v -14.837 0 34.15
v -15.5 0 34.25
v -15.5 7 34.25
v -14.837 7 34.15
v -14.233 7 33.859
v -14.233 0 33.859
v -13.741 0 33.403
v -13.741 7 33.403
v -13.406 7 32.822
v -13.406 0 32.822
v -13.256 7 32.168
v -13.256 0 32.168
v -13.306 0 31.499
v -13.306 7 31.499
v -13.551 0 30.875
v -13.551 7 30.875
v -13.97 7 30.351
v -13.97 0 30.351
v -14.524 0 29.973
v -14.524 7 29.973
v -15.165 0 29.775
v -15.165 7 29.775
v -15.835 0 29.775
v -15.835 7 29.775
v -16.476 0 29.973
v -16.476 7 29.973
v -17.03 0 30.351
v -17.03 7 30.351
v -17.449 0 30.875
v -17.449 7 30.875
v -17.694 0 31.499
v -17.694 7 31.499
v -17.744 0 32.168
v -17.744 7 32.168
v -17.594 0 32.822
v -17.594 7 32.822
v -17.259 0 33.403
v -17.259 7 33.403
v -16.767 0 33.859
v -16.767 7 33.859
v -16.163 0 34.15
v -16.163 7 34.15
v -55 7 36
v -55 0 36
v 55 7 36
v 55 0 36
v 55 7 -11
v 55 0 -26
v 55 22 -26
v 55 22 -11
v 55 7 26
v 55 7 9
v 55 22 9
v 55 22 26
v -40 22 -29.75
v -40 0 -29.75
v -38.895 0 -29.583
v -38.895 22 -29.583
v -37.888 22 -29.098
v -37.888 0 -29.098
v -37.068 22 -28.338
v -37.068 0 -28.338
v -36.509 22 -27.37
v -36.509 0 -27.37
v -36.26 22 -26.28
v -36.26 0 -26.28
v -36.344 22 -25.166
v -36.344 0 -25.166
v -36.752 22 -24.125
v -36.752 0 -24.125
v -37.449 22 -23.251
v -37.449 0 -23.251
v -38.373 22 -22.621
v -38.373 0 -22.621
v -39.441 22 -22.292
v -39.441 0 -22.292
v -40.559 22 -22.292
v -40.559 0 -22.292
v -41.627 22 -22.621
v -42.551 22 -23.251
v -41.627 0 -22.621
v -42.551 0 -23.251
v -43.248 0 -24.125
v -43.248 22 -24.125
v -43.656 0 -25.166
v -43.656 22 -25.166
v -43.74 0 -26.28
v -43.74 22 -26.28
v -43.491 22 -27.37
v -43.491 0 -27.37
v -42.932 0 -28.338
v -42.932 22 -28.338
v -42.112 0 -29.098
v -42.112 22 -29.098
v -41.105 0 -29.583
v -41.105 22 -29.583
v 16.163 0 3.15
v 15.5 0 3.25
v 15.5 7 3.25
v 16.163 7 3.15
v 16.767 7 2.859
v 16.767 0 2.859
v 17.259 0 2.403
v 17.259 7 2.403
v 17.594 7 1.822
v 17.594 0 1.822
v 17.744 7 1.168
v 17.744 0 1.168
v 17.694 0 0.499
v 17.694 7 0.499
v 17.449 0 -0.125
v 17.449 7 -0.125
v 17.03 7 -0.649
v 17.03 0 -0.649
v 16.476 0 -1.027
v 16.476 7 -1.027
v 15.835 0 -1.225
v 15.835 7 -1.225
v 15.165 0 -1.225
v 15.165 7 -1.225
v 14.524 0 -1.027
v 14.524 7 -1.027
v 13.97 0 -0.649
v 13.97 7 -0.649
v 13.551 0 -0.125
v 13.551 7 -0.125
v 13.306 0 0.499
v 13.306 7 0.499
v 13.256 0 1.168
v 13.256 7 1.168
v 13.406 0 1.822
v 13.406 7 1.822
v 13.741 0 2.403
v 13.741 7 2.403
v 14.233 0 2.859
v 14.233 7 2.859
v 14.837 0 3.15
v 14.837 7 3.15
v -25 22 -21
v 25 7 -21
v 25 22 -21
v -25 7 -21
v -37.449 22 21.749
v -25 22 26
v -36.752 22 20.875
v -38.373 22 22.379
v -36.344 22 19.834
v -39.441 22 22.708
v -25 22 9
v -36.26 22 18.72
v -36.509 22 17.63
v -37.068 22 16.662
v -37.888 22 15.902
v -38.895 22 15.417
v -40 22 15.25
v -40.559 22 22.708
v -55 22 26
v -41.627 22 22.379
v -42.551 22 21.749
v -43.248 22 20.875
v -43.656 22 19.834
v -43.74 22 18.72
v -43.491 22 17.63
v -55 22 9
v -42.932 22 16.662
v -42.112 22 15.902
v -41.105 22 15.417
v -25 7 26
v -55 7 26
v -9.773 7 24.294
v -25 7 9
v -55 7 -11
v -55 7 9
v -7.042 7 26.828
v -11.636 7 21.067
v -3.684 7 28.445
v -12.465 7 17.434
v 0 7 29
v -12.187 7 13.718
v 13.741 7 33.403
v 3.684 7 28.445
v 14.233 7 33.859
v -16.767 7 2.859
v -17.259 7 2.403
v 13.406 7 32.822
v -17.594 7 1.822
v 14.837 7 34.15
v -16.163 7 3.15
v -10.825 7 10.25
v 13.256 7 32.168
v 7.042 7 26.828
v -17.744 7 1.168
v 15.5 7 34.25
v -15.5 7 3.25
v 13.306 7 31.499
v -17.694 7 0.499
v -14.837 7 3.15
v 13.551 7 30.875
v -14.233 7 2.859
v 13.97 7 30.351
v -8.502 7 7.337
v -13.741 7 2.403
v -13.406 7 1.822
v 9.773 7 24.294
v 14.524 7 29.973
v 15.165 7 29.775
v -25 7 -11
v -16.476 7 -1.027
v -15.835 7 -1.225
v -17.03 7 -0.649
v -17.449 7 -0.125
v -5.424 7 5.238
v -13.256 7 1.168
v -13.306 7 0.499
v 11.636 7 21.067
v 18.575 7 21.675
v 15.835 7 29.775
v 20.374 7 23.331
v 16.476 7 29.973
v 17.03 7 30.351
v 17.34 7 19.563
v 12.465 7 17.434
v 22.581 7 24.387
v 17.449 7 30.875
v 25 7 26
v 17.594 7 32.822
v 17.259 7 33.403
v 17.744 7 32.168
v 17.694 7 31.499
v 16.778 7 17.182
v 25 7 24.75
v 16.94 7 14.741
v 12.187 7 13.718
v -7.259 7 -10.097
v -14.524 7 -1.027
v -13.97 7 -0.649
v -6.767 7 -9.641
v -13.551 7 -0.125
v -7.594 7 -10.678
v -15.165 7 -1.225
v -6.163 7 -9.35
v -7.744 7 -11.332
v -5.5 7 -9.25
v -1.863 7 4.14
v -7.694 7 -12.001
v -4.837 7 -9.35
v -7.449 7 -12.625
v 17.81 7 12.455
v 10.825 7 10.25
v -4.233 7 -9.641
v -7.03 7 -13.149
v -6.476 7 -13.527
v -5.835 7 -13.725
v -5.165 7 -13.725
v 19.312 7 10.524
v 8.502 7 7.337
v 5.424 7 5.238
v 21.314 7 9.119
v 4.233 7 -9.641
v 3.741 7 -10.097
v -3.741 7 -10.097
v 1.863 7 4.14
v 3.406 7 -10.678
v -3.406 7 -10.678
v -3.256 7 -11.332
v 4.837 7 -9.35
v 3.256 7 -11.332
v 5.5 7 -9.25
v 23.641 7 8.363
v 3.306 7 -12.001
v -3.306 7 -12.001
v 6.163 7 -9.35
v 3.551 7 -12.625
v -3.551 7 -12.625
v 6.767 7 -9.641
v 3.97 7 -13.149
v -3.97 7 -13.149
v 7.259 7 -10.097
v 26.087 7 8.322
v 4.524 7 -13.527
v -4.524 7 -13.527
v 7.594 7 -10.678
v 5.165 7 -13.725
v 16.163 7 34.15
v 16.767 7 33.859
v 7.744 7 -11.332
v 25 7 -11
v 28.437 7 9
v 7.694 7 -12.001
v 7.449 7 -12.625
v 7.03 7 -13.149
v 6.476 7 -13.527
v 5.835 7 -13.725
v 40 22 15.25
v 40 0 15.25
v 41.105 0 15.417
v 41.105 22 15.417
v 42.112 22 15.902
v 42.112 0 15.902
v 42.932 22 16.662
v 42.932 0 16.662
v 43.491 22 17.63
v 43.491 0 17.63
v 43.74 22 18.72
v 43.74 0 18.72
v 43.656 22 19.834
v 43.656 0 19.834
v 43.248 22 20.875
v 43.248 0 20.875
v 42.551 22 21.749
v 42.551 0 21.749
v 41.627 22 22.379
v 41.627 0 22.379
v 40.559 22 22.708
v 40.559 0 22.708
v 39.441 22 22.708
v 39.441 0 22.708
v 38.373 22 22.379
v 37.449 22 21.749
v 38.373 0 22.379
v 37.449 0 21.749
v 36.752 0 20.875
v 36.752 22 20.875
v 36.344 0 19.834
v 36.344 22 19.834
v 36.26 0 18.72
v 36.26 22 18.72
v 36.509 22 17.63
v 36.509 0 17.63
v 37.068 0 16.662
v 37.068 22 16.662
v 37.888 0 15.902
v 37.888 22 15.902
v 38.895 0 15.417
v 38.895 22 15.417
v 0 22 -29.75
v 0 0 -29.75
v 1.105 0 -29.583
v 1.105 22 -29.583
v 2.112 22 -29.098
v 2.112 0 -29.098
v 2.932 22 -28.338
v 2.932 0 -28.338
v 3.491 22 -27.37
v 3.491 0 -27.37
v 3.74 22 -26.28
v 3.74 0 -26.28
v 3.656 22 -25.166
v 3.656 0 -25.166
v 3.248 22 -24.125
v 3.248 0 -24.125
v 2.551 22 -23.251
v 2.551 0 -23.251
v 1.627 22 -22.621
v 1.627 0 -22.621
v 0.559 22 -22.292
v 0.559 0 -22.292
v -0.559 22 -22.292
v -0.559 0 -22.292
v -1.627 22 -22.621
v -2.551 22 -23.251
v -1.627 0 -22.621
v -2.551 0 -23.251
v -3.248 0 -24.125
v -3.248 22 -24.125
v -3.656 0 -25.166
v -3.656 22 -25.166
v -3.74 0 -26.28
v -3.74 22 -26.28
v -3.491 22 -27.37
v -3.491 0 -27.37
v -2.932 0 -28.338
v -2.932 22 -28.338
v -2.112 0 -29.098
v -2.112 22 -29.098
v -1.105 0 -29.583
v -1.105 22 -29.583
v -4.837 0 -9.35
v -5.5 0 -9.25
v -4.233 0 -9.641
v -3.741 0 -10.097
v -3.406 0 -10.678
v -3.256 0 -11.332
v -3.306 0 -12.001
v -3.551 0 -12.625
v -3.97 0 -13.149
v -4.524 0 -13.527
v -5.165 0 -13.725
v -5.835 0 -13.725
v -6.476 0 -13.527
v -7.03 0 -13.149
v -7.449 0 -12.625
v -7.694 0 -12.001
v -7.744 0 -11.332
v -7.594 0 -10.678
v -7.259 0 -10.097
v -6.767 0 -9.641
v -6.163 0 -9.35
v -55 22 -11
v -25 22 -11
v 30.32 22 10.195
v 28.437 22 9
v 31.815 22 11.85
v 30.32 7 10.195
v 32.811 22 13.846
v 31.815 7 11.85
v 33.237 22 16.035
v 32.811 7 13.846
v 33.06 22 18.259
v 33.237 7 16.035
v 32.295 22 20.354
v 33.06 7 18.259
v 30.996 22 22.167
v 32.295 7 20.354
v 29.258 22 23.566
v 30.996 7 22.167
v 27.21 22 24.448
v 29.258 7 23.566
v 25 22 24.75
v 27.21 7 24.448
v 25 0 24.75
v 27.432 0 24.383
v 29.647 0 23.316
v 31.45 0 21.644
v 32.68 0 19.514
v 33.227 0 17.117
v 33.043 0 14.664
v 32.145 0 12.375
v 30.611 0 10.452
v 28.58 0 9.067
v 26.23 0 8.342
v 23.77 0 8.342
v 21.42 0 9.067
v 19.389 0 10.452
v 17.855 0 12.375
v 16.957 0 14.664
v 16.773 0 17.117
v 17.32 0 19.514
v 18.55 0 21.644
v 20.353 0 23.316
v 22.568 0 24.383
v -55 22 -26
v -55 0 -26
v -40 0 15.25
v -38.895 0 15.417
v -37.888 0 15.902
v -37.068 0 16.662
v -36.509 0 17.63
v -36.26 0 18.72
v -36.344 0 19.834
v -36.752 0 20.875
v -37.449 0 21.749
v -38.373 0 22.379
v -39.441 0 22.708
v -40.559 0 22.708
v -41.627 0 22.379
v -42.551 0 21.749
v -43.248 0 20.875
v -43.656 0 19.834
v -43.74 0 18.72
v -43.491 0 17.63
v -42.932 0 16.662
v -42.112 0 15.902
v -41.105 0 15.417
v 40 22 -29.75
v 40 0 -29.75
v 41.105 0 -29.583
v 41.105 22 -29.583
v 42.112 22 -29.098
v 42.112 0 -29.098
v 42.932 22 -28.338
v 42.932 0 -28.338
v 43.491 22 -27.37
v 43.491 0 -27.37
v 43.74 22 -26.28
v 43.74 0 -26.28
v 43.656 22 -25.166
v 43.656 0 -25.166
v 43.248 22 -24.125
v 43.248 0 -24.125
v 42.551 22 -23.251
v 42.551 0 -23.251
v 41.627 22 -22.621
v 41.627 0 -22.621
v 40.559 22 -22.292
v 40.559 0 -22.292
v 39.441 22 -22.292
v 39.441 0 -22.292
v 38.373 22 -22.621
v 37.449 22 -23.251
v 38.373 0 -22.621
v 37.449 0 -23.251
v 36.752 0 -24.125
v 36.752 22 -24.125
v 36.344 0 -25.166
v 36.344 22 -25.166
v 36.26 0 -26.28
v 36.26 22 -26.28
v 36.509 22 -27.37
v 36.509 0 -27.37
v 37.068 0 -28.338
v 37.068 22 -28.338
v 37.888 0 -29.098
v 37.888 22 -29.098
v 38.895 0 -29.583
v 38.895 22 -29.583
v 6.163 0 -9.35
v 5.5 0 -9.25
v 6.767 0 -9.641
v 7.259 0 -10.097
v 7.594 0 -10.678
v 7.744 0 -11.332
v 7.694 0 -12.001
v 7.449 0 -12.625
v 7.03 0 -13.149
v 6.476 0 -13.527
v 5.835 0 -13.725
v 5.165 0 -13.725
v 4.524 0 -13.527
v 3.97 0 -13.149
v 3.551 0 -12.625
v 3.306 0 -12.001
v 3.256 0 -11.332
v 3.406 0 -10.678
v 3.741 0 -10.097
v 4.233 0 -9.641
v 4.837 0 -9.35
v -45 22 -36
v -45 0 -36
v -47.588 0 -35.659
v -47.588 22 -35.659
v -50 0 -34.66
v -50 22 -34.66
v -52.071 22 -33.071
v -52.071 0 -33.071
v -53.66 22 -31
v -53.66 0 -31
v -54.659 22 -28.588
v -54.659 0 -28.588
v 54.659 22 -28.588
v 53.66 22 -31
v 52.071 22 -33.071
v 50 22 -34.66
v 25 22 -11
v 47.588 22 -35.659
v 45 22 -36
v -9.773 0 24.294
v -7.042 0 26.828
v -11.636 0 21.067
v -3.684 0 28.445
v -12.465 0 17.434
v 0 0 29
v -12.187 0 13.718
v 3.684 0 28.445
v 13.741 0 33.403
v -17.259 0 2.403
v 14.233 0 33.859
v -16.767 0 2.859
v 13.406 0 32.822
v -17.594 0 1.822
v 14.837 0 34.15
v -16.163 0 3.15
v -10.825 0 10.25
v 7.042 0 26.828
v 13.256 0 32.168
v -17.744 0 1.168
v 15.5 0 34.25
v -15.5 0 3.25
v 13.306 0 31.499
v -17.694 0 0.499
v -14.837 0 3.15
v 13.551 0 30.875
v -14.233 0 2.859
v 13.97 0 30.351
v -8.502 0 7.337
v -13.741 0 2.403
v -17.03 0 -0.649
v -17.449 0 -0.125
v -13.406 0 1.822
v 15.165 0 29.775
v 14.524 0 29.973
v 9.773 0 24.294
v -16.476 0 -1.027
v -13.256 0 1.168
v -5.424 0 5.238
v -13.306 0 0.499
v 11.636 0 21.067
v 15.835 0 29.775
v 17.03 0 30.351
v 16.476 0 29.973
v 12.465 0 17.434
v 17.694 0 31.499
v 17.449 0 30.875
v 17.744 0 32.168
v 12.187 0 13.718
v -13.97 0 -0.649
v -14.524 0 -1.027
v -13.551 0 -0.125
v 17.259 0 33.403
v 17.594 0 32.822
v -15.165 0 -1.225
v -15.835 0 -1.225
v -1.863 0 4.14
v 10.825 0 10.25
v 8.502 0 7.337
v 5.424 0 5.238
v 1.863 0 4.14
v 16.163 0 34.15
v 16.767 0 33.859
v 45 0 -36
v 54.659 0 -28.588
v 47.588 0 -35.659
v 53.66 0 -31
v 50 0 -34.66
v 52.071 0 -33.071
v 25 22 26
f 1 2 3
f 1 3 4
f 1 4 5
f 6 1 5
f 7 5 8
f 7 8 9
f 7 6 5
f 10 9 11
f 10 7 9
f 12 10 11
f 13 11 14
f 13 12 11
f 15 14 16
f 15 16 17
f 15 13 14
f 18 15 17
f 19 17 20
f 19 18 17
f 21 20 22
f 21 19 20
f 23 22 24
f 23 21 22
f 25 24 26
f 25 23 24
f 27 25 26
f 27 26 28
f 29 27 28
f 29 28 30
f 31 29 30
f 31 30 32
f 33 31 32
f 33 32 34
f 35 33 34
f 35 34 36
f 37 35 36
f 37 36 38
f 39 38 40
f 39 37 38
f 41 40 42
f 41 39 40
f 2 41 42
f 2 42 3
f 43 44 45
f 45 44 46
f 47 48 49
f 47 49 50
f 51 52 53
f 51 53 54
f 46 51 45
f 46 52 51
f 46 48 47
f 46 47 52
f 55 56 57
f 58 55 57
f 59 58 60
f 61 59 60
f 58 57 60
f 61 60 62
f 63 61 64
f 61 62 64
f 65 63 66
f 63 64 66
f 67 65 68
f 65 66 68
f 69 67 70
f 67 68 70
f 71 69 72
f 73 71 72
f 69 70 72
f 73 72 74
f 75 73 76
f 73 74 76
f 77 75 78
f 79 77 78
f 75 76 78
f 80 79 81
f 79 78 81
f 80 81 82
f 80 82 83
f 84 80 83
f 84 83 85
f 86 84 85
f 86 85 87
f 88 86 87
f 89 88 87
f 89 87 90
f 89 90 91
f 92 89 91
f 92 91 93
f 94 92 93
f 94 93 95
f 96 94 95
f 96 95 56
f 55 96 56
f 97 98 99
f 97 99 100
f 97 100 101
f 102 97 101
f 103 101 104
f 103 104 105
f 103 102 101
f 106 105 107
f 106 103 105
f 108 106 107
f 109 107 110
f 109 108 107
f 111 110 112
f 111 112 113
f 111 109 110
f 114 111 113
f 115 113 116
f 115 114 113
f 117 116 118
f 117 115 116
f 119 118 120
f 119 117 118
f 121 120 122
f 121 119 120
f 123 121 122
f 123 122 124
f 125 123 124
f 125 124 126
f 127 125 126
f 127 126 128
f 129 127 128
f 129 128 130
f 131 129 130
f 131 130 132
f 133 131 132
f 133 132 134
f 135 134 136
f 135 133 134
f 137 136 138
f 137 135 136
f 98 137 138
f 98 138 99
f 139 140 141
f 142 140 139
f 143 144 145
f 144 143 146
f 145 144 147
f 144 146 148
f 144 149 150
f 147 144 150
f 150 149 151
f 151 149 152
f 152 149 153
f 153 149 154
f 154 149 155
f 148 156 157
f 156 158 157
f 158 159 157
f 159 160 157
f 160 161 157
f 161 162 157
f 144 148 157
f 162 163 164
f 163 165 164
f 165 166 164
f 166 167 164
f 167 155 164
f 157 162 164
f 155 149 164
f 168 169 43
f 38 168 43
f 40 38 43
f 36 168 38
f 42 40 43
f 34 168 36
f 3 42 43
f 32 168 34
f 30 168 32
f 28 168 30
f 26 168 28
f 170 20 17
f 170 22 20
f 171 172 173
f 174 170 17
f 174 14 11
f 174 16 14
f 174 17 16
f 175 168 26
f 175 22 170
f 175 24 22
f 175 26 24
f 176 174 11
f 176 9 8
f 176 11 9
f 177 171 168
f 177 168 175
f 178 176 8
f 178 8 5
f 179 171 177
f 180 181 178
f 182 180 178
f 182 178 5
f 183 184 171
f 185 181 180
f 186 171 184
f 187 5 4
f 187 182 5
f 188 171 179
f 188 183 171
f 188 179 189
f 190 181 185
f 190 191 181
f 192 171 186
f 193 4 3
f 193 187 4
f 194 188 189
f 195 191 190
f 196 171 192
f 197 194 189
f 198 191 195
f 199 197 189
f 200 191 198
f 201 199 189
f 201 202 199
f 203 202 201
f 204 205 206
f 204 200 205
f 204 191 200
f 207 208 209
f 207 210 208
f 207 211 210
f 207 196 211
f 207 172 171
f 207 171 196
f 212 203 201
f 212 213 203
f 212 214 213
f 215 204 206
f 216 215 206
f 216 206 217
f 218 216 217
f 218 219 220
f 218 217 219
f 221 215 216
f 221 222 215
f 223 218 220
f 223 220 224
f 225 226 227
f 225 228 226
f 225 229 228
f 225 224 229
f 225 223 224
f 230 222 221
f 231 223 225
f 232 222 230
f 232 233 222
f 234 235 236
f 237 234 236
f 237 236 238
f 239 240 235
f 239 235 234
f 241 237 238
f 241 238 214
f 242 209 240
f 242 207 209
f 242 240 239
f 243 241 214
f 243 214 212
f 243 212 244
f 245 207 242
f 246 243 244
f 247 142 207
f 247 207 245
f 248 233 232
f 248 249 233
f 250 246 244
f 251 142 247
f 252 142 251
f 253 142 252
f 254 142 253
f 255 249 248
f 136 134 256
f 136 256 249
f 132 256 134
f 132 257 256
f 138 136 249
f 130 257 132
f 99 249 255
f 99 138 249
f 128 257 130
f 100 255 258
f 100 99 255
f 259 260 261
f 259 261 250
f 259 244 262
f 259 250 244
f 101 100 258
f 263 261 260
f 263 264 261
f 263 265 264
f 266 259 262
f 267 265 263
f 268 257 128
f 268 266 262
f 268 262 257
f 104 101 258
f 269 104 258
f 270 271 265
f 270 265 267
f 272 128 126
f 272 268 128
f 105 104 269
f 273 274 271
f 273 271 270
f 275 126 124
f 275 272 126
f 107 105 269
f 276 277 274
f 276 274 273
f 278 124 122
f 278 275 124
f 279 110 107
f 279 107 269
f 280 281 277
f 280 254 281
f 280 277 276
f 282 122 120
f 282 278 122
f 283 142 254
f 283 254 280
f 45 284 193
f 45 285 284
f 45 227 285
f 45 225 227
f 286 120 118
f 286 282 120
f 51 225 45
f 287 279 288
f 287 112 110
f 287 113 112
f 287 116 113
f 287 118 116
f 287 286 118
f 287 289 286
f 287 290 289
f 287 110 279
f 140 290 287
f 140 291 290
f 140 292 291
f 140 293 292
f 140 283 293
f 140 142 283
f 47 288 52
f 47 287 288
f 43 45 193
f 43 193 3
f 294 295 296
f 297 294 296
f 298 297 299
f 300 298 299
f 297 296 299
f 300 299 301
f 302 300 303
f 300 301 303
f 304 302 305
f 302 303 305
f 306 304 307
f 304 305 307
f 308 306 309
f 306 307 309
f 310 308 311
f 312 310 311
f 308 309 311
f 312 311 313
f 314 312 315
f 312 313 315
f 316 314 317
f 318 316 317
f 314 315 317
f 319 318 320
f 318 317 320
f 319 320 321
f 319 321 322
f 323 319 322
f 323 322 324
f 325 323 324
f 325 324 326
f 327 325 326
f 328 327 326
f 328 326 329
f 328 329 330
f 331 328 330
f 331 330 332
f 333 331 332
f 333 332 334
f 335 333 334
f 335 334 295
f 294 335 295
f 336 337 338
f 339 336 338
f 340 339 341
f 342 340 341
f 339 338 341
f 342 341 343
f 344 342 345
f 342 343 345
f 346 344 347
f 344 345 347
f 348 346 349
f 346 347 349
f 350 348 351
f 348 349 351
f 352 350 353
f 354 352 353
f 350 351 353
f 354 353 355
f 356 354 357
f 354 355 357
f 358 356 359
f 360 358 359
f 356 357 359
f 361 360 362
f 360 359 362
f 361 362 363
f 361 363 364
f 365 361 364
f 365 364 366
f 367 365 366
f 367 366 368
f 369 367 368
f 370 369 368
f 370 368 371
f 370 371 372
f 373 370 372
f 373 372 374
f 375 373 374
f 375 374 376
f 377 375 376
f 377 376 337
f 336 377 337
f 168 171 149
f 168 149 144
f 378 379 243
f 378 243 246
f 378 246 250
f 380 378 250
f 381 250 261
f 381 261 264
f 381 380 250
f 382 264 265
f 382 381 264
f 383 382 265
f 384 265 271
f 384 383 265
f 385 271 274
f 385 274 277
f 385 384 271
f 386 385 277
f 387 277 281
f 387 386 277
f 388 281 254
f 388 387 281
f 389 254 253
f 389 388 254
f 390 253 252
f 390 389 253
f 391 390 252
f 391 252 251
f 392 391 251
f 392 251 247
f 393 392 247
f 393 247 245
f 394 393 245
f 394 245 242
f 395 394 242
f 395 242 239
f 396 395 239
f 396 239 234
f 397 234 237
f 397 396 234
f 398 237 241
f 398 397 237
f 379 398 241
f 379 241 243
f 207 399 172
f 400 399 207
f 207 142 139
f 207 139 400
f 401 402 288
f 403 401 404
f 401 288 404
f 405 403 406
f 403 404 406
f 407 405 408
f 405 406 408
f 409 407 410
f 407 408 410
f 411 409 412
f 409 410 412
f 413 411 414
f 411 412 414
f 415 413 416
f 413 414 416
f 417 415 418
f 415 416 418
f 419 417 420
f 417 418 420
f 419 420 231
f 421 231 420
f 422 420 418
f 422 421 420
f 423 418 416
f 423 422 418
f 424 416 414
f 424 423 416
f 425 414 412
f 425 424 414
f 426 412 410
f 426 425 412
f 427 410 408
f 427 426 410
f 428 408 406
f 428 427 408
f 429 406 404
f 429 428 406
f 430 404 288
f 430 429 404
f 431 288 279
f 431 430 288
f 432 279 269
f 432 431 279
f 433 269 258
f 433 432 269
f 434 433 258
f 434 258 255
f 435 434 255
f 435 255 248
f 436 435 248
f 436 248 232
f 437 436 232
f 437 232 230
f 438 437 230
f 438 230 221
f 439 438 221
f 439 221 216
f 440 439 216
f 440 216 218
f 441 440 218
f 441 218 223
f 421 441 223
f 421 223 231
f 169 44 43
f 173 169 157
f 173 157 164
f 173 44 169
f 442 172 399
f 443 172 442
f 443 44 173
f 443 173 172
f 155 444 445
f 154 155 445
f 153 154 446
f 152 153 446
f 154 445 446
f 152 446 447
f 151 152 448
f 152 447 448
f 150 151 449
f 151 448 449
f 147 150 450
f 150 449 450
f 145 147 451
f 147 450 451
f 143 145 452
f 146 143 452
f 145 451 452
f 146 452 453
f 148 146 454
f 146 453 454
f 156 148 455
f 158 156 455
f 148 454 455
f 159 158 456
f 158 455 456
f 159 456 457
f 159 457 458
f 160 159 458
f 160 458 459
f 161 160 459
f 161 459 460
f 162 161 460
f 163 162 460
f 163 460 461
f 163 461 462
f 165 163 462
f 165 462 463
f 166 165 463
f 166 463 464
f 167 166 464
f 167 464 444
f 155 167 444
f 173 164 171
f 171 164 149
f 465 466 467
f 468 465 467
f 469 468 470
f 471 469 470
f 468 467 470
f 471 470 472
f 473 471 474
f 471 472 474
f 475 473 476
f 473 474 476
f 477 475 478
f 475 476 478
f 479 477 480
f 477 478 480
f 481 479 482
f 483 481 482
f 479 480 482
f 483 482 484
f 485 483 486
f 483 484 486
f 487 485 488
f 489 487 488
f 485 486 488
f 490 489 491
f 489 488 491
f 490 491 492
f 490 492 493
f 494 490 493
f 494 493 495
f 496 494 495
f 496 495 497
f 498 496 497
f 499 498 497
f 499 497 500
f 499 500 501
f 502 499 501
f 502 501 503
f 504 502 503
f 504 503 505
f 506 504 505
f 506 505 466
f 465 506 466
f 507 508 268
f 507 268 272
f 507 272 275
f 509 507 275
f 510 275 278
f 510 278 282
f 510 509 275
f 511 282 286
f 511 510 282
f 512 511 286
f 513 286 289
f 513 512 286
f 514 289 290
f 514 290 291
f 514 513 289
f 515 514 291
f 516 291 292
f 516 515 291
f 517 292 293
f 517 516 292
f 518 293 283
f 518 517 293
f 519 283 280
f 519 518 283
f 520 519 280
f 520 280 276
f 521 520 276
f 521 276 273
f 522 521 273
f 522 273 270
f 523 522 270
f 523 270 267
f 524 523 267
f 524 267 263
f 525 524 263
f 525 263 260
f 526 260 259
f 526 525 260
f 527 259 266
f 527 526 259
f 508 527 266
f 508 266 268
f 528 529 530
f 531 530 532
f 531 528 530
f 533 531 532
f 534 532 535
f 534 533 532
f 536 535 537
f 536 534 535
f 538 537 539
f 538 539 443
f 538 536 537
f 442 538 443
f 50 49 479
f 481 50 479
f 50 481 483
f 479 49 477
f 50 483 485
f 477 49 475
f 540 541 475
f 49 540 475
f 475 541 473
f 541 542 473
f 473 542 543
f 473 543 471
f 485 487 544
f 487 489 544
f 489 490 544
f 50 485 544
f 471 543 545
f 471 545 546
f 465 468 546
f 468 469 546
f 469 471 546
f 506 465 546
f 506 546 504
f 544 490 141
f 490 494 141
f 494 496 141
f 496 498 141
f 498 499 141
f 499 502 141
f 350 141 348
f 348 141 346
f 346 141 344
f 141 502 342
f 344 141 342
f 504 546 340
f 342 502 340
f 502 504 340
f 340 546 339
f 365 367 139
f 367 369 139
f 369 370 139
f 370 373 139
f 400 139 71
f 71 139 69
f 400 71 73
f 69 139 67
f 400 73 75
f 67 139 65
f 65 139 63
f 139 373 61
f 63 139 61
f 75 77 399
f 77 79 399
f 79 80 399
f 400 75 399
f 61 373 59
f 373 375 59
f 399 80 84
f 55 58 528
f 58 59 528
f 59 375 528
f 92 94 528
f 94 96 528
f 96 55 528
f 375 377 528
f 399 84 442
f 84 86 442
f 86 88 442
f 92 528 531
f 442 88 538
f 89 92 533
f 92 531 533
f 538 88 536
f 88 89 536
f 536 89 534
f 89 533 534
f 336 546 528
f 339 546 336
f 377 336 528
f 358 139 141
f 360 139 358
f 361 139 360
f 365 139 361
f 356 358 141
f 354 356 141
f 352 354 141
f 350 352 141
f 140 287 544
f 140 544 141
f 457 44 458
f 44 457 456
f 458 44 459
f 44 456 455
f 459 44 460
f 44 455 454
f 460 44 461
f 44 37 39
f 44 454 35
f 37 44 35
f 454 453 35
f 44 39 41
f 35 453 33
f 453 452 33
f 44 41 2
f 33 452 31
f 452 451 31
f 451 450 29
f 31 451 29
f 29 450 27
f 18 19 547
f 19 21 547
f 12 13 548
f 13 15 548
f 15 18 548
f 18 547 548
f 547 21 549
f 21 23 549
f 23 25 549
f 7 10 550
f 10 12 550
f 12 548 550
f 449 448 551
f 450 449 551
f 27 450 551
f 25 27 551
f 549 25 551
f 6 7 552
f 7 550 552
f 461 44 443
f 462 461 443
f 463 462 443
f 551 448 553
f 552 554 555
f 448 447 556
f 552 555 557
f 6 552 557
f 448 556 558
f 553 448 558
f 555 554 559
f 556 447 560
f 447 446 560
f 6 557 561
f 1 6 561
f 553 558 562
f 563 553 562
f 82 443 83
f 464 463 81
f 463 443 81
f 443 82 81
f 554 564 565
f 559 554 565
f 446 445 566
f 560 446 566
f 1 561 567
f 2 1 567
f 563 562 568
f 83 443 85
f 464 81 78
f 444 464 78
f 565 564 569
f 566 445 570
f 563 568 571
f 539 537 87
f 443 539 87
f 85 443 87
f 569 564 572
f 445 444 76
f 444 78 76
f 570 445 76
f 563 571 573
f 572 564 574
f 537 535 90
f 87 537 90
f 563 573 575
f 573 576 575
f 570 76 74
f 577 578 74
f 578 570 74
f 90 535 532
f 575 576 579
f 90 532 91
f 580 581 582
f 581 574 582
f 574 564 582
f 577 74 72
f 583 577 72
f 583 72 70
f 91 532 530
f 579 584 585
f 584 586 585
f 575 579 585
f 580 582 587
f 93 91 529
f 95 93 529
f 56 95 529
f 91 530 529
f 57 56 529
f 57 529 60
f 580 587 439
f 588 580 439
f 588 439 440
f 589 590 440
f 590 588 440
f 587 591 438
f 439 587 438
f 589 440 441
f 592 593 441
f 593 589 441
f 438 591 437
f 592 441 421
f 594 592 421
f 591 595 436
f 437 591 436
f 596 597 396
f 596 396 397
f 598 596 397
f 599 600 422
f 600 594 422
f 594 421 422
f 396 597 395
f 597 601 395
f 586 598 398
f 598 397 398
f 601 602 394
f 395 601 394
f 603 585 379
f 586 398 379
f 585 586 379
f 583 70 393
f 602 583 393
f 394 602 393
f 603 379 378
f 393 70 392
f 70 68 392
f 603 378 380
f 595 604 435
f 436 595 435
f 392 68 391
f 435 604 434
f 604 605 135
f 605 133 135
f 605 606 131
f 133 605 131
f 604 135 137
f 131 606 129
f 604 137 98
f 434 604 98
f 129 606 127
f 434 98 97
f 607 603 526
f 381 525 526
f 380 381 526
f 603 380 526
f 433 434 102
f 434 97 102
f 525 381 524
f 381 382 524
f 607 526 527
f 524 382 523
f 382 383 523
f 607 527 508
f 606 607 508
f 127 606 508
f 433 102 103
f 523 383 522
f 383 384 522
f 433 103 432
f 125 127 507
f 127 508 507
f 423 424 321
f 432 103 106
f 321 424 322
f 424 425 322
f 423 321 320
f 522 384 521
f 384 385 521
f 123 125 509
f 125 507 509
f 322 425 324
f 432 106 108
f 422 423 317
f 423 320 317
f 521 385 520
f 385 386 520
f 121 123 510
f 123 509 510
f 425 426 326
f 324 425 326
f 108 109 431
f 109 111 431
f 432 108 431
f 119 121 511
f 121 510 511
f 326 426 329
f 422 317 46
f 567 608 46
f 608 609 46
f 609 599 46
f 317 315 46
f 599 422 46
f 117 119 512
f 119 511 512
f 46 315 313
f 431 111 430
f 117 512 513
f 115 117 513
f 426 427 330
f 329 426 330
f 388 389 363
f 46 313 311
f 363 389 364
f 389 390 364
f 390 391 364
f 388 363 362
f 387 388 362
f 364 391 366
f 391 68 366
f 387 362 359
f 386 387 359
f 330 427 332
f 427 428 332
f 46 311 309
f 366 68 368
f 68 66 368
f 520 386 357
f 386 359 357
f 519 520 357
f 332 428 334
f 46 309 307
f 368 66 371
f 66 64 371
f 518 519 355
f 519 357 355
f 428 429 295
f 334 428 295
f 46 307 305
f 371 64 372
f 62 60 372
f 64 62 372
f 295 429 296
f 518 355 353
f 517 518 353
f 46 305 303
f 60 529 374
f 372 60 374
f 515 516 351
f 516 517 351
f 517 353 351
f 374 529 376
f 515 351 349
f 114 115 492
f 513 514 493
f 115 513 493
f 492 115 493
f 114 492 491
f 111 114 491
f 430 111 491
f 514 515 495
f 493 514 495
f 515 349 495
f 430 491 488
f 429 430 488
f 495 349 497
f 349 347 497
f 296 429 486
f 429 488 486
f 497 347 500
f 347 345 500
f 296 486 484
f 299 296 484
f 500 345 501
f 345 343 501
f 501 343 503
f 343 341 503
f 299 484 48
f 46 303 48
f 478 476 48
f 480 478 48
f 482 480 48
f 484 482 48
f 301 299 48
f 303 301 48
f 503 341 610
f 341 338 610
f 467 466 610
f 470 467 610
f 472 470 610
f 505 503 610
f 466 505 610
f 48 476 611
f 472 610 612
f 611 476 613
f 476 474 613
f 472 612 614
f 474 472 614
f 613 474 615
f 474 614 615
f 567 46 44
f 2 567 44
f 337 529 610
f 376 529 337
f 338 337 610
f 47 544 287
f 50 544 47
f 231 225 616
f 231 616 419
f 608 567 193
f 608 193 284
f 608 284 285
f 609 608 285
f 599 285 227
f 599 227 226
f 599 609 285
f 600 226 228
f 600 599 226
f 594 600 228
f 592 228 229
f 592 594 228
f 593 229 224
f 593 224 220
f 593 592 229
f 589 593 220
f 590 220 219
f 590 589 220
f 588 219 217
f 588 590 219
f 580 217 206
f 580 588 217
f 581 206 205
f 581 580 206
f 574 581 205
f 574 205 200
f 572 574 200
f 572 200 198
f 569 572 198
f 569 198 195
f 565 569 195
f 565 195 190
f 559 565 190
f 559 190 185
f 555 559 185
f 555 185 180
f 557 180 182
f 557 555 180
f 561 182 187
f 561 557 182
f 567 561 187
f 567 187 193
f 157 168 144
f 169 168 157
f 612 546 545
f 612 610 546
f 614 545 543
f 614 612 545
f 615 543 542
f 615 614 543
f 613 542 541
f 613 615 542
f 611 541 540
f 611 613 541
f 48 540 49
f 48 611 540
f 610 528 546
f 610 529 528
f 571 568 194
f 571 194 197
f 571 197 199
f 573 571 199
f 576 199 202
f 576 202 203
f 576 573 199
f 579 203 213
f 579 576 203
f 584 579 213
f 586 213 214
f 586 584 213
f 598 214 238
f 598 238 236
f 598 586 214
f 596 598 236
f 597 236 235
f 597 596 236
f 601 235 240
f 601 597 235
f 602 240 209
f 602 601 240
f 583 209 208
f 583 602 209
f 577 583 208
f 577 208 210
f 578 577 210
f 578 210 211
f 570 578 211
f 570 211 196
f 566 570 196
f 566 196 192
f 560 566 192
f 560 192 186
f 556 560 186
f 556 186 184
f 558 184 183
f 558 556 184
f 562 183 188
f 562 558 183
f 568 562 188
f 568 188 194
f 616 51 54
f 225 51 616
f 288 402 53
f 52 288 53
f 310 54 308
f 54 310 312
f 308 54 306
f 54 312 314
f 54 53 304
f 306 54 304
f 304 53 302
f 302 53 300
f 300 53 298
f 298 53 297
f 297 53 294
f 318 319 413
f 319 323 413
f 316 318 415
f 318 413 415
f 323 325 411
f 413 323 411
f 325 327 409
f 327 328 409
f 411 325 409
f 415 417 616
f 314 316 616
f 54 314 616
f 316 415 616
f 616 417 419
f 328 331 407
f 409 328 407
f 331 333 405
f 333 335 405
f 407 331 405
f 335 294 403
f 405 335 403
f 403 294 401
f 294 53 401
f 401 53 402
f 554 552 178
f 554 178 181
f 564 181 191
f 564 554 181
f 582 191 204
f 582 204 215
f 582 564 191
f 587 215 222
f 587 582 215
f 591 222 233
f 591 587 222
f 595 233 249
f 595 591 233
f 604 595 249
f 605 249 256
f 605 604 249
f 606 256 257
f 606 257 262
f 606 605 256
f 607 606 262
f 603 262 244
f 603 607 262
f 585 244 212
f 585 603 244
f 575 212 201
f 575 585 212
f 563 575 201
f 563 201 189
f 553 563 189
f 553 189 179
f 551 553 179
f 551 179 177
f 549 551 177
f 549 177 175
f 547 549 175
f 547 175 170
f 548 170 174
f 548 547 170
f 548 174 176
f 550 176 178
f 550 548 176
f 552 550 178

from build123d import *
from build123d.topology import SkipClean

# Parameters (mm, degrees)
SKETCH1_W           = 110
SKETCH1_H           = 72
SKETCH1_R           = 12.5
SKETCH1_R_2         = 2.25
SKETCH1_R_3         = 8.25
BOSS_EXTRUDE1_DEPTH = 7
BOSS_EXTRUDE2_DEPTH = 15
FILLET2_R           = 10
SKETCH3_R           = 3.75
CUT_EXTRUDE1_DEPTH  = 70.318107302
SKETCH4_W           = 30
SKETCH4_H           = 20
CUT_EXTRUDE2_DEPTH  = 15
CUT_EXTRUDE3_DEPTH  = 68.424031324


with BuildPart() as part:
    # Sketch1 → Boss-Extrude1 (new body)
    with BuildSketch(Plane(origin=(0, 0, 0), x_dir=(1, 0, 0), z_dir=(0, 1, 0))):
        Rectangle(SKETCH1_W, SKETCH1_H)
        with Locations(Location((0, -16.5, 0), (0, 0, 270))):
            Circle(SKETCH1_R, mode=Mode.SUBTRACT)
        with Locations(Location((-15.5, -32, 0), (0, 0, 270))):
            Circle(SKETCH1_R_2, mode=Mode.SUBTRACT)
        with Locations(Location((-15.5, -1, 0), (0, 0, 270))):
            Circle(SKETCH1_R_2, mode=Mode.SUBTRACT)
        with Locations(Location((15.5, -1, 0), (0, 0, 270))):
            Circle(SKETCH1_R_2, mode=Mode.SUBTRACT)
        with Locations(Location((15.5, -32, 0), (0, 0, 270))):
            Circle(SKETCH1_R_2, mode=Mode.SUBTRACT)
        with Locations(Location((25, -16.5, 0), (0, 0, 270))):
            Circle(SKETCH1_R_3, mode=Mode.SUBTRACT)
        with Locations(Location((-5.5, 11.5, 0), (0, 0, 270))):
            Circle(SKETCH1_R_2, mode=Mode.SUBTRACT)
        with Locations(Location((5.5, 11.5, 0), (0, 0, 270))):
            Circle(SKETCH1_R_2, mode=Mode.SUBTRACT)
    extrude(amount=BOSS_EXTRUDE1_DEPTH)

    # Sketch2 → Boss-Extrude2 (add)
    with BuildSketch(Plane(origin=(0, 7, 0), x_dir=(1, 0, 0), z_dir=(0, 1, 0))):
        Polygon((-55, 36), (55, 36), (55, -26), (25, -26), (25, 21), (-25, 21), (-25, -26), (-55, -26), align=None)
    extrude(amount=BOSS_EXTRUDE2_DEPTH)

    # Fillet2
    fillet2_edges = [part.edges().sort_by_distance(p)[0] for p in [
        (-55, 11, -36),
        (55, 11, -36),
    ]]
    fillet(fillet2_edges, radius=FILLET2_R)

    # Sketch3 → Cut-Extrude1 (cut, through all)
    with BuildSketch(Plane.XZ):
        with Locations(Location((40, -26, 0), (0, 0, 270))):
            Circle(SKETCH3_R)
        with Locations(Location((-40, -26, 0), (0, 0, 270))):
            Circle(SKETCH3_R)
        with Locations(Location((-40, 19, 0), (0, 0, 270))):
            Circle(SKETCH3_R)
        with Locations(Location((0, -26, 0), (0, 0, 270))):
            Circle(SKETCH3_R)
        with Locations(Location((40, 19, 0), (0, 0, 270))):
            Circle(SKETCH3_R)
    extrude(amount=-CUT_EXTRUDE1_DEPTH, mode=Mode.SUBTRACT)

    # Sketch4 → Cut-Extrude2 (cut)
    with BuildSketch(Plane(origin=(0, 22, 0), x_dir=(1, 0, 0), z_dir=(0, 1, 0))):
        with Locations((40, 1)):
            Rectangle(SKETCH4_W, SKETCH4_H)
        with Locations((-40, 1)):
            Rectangle(SKETCH4_W, SKETCH4_H)
    extrude(amount=-CUT_EXTRUDE2_DEPTH, mode=Mode.SUBTRACT)

    # Sketch5 → Cut-Extrude3 (cut, through all)
    with SkipClean():  # the faces are left unmerged after this step: merging them gives an invalid solid
        with BuildSketch(Plane.XZ.offset(-7)):
            with BuildLine():
                Line((25, 24.75), (25, 9))
                Line((25, 9), (28.436931771, 9))
                ThreePointArc((28.436931771, 9), (33.060319473, 18.25890591), (25, 24.75))
            make_face()
        extrude(amount=-CUT_EXTRUDE3_DEPTH, mode=Mode.SUBTRACT)


solid = part.part
